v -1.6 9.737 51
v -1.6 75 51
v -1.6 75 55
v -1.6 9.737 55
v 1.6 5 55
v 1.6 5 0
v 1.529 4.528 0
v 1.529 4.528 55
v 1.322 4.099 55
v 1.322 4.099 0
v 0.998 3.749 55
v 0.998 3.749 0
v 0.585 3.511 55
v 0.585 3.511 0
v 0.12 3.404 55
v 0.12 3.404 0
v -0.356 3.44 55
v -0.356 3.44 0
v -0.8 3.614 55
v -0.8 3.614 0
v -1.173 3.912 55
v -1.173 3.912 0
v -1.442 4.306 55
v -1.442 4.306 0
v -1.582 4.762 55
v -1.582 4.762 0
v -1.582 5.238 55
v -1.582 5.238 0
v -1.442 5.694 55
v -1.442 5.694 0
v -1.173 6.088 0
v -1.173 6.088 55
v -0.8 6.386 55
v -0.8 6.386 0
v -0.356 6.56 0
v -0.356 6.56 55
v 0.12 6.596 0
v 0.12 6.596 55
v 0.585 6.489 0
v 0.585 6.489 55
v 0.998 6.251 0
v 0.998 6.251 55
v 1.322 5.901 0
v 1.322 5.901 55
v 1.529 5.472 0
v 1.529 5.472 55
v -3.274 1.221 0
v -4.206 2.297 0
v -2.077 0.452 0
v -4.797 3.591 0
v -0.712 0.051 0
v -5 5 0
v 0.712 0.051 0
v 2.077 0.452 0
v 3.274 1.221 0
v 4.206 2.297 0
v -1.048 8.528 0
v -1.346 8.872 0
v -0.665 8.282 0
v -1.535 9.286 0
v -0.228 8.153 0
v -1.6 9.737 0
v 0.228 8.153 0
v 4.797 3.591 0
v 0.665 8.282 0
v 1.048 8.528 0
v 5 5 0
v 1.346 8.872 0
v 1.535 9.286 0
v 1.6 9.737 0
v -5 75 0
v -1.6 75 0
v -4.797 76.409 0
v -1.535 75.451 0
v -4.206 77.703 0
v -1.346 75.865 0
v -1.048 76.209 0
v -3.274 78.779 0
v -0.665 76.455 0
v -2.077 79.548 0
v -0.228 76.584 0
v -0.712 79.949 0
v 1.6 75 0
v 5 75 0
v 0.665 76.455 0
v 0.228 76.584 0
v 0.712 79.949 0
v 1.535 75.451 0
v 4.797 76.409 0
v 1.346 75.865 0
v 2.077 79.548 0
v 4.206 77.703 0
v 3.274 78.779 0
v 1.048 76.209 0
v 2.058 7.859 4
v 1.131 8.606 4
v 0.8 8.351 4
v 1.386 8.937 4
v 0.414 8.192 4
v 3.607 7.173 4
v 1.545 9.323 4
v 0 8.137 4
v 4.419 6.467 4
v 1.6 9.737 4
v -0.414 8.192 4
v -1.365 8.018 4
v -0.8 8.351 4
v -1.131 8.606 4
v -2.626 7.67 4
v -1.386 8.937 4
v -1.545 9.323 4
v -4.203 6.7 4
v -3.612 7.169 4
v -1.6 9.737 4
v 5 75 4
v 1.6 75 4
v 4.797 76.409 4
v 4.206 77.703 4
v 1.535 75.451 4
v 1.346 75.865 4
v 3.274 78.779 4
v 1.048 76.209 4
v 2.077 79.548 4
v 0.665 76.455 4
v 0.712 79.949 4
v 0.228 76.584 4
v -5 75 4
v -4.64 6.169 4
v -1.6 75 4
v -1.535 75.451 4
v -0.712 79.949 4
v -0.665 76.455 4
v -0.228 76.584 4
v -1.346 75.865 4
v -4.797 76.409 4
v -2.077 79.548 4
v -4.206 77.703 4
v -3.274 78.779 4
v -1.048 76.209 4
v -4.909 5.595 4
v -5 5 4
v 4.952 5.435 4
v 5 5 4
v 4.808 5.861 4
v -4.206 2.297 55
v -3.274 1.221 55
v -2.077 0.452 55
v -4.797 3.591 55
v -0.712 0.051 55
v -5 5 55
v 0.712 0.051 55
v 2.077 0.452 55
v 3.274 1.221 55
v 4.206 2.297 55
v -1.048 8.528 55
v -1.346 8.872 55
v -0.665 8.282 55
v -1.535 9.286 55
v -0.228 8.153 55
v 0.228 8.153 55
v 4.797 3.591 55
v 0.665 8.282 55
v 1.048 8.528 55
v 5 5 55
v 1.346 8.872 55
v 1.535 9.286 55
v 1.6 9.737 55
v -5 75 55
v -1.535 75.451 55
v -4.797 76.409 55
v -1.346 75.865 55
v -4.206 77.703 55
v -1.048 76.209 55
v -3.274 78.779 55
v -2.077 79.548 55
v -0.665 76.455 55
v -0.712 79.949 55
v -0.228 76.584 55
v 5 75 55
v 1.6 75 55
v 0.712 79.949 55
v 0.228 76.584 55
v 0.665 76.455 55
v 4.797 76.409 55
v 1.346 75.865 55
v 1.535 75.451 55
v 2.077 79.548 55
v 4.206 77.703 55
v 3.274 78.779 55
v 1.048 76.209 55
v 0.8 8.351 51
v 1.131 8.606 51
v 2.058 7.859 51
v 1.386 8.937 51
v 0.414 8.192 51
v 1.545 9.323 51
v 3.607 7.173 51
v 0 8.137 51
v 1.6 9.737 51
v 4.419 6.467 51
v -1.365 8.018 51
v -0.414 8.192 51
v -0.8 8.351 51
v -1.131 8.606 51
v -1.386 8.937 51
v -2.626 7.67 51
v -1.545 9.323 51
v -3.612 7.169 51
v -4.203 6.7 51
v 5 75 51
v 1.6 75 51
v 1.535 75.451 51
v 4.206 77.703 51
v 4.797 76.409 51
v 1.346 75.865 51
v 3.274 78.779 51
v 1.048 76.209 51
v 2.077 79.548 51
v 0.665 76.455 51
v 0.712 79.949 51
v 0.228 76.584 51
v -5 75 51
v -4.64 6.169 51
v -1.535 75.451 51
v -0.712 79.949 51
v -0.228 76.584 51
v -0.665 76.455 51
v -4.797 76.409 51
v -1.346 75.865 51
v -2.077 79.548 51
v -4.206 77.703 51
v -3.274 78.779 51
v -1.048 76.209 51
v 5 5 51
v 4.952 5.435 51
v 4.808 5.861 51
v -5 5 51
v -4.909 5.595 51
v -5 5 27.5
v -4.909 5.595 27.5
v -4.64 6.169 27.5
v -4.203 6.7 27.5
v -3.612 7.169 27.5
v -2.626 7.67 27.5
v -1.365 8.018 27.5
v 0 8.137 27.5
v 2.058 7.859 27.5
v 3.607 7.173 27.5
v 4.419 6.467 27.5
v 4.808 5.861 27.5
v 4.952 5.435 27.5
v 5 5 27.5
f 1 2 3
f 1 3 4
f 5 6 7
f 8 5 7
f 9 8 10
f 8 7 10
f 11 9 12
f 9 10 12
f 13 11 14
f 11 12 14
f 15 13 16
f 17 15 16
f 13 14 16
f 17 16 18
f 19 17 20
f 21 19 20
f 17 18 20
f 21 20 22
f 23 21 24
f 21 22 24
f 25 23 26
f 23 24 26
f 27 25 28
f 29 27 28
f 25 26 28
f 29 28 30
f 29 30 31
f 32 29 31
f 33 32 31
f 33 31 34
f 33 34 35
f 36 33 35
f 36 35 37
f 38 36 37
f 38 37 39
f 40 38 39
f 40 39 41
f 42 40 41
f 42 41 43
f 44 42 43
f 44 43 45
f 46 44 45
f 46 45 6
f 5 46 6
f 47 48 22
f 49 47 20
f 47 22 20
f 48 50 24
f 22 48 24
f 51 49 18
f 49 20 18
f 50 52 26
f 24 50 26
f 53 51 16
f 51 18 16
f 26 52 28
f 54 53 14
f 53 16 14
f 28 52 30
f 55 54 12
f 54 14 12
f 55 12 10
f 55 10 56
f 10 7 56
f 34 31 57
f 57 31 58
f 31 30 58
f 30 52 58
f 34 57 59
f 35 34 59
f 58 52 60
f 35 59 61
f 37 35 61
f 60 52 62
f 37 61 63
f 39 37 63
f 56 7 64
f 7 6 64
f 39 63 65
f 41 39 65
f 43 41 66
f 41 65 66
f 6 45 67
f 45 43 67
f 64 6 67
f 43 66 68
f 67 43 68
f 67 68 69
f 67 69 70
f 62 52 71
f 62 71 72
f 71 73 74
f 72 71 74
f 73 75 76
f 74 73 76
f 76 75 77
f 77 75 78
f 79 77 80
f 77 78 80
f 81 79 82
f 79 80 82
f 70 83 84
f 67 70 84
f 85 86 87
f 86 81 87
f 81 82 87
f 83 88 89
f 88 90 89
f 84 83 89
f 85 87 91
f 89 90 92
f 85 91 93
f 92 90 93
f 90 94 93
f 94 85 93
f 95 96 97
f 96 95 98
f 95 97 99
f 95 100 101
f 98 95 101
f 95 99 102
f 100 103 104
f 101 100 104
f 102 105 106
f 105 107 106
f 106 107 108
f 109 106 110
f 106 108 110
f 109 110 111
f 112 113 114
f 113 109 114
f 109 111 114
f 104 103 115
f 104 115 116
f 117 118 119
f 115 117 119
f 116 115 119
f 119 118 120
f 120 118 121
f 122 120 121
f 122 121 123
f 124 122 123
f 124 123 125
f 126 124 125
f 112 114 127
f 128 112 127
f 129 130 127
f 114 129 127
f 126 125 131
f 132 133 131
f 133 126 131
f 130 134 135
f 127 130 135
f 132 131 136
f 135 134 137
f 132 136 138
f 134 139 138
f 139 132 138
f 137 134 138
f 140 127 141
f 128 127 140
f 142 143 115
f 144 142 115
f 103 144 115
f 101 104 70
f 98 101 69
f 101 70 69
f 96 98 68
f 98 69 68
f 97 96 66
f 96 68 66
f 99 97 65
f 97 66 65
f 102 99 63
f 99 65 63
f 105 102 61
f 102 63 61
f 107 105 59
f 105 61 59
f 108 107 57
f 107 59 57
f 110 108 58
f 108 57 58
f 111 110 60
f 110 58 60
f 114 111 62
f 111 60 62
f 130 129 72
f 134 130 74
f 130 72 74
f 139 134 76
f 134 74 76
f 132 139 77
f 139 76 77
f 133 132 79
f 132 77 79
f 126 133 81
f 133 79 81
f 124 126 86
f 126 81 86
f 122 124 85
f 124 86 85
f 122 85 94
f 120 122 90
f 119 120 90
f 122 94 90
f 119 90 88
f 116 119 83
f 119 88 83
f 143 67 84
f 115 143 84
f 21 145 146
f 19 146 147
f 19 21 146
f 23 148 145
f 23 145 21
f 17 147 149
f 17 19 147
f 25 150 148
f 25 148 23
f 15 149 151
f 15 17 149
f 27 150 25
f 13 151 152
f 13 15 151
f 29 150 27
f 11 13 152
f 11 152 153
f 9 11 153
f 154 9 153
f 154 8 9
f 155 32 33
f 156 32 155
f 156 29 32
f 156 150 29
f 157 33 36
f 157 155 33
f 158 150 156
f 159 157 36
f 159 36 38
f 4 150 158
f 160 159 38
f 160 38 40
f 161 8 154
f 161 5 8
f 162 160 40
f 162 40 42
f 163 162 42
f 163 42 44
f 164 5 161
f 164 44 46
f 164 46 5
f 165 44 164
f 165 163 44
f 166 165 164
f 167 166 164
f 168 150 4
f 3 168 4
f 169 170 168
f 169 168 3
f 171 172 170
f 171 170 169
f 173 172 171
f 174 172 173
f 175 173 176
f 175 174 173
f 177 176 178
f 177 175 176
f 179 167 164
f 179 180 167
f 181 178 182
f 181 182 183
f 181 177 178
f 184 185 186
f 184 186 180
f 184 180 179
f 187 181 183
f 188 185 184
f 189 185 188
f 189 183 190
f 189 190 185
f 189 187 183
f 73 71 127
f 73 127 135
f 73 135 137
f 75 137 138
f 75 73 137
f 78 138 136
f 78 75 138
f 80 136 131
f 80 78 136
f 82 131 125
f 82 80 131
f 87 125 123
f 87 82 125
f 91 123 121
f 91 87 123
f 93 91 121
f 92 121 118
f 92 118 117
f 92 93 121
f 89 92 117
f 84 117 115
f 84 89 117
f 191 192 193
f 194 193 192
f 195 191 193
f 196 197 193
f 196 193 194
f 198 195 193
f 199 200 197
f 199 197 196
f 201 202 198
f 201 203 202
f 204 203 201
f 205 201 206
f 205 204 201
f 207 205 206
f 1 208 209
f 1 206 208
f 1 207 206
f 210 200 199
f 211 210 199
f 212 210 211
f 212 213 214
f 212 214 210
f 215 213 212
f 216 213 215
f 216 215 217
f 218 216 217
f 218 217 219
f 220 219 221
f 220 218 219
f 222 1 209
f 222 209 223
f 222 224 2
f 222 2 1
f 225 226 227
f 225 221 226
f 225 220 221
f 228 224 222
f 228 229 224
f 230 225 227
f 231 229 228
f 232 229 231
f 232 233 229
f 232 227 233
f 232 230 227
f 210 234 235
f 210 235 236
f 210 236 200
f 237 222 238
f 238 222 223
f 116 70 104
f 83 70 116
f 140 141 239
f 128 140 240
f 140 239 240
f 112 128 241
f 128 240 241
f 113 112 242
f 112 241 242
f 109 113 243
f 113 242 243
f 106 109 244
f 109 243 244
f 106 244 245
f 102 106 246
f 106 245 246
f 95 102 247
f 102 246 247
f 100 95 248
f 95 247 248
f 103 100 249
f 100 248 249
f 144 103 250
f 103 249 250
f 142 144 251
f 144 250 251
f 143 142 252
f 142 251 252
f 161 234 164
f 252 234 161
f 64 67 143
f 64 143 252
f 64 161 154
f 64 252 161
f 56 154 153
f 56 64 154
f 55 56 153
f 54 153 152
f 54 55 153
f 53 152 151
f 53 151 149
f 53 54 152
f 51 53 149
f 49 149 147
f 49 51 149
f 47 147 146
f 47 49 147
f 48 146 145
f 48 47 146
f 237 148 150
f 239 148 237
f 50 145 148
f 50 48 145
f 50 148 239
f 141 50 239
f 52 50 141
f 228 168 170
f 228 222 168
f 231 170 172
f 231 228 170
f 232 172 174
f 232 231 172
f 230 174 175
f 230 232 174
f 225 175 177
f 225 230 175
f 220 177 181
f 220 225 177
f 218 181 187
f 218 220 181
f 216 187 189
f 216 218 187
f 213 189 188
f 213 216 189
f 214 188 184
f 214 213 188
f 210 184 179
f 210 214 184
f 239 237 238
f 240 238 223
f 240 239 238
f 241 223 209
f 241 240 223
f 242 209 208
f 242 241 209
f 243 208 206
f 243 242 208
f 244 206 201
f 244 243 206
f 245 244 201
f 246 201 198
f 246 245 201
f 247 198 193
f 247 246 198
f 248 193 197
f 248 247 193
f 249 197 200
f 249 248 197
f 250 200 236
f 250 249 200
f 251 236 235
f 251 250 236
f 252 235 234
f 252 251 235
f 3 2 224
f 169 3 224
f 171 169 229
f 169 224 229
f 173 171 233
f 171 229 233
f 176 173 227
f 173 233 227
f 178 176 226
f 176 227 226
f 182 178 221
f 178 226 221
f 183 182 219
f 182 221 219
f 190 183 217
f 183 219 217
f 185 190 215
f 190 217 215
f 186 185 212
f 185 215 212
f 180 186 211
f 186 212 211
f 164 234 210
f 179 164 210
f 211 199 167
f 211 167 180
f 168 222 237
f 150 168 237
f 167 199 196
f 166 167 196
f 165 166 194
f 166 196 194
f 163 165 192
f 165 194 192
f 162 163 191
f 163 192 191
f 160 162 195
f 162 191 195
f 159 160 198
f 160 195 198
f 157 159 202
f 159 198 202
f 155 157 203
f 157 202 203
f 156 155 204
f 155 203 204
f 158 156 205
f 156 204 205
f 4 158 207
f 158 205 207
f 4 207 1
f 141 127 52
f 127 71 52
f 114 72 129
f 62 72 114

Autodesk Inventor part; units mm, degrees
ref_plane "YZ Plane" through (0, 0, 0) normal (1, 0, 0) x (0, 1, 0)
ref_plane "XZ Plane" through (0, 0, 0) normal (0, 1, 0) x (-1, 0, 0)
ref_plane "XY Plane" through (0, 0, 0) normal (0, 0, 1) x (1, 0, 0)
sketch "Эскиз1" plane through (0, 0, 0) normal (0, 0, 1) x (1, 0, 0)
  line L0 (0, 0) -> (0, 80)
  line L1 (0, 0) -> (0, 5)
  line L2 (0, 80) -> (0, 75)
  circle A0 centre (0, 75) radius 5
  circle A1 centre (0, 5) radius 5
  circle A2 centre (0, 5) radius 1.6
  circle A3 centre (0, 75) radius 1.6
  line L3 (-1.6, 75) -> (-1.6, 5)
  line L4 (1.6, 5) -> (1.6, 75)
  line L5 (-5, 75) -> (-5, 5)
  line L6 (5, 5) -> (5, 75)
  line L7 (-1.6, 9.7371) -> (1.6, 9.7371)
  circle A4 centre (0, 9.7371) radius 1.6
  point P0 (-1.6, 9.7371)
  dimension "d0" = 80
  dimension "d1" = 5
  dimension "d2" = 5
  dimension "d3" = 3.2
  dimension "d4" = 3.2
extrude "Выдавливание1" add sketch "Эскиз1" along normal blind 55 contours A1 L3 A2 L0 | L0 A2 L4 A1 | L5 A0 L3 A1 | A1 L4 A0 L6 | L3 A4 L0 A2 | A2 L0 A4 L4 | A0 L0 A3 L3 | A0 L4 A3 L0 picked at (-1.9727, 72.0221) picked at (1.9727, 72.0221)
ref_plane "РабПлоскость1" through (0, 0, 27.5) normal (0, 0, -1) x (-1, 0, 0)
sketch "Эскиз2" plane through (0, 0, 27.5) normal (0, 0, -1) x (-1, 0, 0)
  circle A0 centre (0, 5) radius 1.6 projected
  circle A1 centre (0, 5) radius 5
  line L0 (-5, 5) -> (-5, 75) projected
  ellipse E0 centre (0, 5) end of major axis (-5, 5) minor radius 3.1371
  line L1 (5, 75) -> (5, 5) projected
  line L2 (5, 5) -> (-5, 5)
  line L3 (-5, 5) -> (-5, 83.8736)
  line L4 (-5, 83.8736) -> (5, 83.8736)
  line L5 (5, 83.8736) -> (5, 5)
  point P0 (0, 0)
extrude "Выдавливание2" cut sketch "Эскиз2" against normal mid plane 47 contours E0 A1 | A1 L0 L3 L4 L5 L1 picked at (-0.9942, 8.9185)
properties part number "arrow"
